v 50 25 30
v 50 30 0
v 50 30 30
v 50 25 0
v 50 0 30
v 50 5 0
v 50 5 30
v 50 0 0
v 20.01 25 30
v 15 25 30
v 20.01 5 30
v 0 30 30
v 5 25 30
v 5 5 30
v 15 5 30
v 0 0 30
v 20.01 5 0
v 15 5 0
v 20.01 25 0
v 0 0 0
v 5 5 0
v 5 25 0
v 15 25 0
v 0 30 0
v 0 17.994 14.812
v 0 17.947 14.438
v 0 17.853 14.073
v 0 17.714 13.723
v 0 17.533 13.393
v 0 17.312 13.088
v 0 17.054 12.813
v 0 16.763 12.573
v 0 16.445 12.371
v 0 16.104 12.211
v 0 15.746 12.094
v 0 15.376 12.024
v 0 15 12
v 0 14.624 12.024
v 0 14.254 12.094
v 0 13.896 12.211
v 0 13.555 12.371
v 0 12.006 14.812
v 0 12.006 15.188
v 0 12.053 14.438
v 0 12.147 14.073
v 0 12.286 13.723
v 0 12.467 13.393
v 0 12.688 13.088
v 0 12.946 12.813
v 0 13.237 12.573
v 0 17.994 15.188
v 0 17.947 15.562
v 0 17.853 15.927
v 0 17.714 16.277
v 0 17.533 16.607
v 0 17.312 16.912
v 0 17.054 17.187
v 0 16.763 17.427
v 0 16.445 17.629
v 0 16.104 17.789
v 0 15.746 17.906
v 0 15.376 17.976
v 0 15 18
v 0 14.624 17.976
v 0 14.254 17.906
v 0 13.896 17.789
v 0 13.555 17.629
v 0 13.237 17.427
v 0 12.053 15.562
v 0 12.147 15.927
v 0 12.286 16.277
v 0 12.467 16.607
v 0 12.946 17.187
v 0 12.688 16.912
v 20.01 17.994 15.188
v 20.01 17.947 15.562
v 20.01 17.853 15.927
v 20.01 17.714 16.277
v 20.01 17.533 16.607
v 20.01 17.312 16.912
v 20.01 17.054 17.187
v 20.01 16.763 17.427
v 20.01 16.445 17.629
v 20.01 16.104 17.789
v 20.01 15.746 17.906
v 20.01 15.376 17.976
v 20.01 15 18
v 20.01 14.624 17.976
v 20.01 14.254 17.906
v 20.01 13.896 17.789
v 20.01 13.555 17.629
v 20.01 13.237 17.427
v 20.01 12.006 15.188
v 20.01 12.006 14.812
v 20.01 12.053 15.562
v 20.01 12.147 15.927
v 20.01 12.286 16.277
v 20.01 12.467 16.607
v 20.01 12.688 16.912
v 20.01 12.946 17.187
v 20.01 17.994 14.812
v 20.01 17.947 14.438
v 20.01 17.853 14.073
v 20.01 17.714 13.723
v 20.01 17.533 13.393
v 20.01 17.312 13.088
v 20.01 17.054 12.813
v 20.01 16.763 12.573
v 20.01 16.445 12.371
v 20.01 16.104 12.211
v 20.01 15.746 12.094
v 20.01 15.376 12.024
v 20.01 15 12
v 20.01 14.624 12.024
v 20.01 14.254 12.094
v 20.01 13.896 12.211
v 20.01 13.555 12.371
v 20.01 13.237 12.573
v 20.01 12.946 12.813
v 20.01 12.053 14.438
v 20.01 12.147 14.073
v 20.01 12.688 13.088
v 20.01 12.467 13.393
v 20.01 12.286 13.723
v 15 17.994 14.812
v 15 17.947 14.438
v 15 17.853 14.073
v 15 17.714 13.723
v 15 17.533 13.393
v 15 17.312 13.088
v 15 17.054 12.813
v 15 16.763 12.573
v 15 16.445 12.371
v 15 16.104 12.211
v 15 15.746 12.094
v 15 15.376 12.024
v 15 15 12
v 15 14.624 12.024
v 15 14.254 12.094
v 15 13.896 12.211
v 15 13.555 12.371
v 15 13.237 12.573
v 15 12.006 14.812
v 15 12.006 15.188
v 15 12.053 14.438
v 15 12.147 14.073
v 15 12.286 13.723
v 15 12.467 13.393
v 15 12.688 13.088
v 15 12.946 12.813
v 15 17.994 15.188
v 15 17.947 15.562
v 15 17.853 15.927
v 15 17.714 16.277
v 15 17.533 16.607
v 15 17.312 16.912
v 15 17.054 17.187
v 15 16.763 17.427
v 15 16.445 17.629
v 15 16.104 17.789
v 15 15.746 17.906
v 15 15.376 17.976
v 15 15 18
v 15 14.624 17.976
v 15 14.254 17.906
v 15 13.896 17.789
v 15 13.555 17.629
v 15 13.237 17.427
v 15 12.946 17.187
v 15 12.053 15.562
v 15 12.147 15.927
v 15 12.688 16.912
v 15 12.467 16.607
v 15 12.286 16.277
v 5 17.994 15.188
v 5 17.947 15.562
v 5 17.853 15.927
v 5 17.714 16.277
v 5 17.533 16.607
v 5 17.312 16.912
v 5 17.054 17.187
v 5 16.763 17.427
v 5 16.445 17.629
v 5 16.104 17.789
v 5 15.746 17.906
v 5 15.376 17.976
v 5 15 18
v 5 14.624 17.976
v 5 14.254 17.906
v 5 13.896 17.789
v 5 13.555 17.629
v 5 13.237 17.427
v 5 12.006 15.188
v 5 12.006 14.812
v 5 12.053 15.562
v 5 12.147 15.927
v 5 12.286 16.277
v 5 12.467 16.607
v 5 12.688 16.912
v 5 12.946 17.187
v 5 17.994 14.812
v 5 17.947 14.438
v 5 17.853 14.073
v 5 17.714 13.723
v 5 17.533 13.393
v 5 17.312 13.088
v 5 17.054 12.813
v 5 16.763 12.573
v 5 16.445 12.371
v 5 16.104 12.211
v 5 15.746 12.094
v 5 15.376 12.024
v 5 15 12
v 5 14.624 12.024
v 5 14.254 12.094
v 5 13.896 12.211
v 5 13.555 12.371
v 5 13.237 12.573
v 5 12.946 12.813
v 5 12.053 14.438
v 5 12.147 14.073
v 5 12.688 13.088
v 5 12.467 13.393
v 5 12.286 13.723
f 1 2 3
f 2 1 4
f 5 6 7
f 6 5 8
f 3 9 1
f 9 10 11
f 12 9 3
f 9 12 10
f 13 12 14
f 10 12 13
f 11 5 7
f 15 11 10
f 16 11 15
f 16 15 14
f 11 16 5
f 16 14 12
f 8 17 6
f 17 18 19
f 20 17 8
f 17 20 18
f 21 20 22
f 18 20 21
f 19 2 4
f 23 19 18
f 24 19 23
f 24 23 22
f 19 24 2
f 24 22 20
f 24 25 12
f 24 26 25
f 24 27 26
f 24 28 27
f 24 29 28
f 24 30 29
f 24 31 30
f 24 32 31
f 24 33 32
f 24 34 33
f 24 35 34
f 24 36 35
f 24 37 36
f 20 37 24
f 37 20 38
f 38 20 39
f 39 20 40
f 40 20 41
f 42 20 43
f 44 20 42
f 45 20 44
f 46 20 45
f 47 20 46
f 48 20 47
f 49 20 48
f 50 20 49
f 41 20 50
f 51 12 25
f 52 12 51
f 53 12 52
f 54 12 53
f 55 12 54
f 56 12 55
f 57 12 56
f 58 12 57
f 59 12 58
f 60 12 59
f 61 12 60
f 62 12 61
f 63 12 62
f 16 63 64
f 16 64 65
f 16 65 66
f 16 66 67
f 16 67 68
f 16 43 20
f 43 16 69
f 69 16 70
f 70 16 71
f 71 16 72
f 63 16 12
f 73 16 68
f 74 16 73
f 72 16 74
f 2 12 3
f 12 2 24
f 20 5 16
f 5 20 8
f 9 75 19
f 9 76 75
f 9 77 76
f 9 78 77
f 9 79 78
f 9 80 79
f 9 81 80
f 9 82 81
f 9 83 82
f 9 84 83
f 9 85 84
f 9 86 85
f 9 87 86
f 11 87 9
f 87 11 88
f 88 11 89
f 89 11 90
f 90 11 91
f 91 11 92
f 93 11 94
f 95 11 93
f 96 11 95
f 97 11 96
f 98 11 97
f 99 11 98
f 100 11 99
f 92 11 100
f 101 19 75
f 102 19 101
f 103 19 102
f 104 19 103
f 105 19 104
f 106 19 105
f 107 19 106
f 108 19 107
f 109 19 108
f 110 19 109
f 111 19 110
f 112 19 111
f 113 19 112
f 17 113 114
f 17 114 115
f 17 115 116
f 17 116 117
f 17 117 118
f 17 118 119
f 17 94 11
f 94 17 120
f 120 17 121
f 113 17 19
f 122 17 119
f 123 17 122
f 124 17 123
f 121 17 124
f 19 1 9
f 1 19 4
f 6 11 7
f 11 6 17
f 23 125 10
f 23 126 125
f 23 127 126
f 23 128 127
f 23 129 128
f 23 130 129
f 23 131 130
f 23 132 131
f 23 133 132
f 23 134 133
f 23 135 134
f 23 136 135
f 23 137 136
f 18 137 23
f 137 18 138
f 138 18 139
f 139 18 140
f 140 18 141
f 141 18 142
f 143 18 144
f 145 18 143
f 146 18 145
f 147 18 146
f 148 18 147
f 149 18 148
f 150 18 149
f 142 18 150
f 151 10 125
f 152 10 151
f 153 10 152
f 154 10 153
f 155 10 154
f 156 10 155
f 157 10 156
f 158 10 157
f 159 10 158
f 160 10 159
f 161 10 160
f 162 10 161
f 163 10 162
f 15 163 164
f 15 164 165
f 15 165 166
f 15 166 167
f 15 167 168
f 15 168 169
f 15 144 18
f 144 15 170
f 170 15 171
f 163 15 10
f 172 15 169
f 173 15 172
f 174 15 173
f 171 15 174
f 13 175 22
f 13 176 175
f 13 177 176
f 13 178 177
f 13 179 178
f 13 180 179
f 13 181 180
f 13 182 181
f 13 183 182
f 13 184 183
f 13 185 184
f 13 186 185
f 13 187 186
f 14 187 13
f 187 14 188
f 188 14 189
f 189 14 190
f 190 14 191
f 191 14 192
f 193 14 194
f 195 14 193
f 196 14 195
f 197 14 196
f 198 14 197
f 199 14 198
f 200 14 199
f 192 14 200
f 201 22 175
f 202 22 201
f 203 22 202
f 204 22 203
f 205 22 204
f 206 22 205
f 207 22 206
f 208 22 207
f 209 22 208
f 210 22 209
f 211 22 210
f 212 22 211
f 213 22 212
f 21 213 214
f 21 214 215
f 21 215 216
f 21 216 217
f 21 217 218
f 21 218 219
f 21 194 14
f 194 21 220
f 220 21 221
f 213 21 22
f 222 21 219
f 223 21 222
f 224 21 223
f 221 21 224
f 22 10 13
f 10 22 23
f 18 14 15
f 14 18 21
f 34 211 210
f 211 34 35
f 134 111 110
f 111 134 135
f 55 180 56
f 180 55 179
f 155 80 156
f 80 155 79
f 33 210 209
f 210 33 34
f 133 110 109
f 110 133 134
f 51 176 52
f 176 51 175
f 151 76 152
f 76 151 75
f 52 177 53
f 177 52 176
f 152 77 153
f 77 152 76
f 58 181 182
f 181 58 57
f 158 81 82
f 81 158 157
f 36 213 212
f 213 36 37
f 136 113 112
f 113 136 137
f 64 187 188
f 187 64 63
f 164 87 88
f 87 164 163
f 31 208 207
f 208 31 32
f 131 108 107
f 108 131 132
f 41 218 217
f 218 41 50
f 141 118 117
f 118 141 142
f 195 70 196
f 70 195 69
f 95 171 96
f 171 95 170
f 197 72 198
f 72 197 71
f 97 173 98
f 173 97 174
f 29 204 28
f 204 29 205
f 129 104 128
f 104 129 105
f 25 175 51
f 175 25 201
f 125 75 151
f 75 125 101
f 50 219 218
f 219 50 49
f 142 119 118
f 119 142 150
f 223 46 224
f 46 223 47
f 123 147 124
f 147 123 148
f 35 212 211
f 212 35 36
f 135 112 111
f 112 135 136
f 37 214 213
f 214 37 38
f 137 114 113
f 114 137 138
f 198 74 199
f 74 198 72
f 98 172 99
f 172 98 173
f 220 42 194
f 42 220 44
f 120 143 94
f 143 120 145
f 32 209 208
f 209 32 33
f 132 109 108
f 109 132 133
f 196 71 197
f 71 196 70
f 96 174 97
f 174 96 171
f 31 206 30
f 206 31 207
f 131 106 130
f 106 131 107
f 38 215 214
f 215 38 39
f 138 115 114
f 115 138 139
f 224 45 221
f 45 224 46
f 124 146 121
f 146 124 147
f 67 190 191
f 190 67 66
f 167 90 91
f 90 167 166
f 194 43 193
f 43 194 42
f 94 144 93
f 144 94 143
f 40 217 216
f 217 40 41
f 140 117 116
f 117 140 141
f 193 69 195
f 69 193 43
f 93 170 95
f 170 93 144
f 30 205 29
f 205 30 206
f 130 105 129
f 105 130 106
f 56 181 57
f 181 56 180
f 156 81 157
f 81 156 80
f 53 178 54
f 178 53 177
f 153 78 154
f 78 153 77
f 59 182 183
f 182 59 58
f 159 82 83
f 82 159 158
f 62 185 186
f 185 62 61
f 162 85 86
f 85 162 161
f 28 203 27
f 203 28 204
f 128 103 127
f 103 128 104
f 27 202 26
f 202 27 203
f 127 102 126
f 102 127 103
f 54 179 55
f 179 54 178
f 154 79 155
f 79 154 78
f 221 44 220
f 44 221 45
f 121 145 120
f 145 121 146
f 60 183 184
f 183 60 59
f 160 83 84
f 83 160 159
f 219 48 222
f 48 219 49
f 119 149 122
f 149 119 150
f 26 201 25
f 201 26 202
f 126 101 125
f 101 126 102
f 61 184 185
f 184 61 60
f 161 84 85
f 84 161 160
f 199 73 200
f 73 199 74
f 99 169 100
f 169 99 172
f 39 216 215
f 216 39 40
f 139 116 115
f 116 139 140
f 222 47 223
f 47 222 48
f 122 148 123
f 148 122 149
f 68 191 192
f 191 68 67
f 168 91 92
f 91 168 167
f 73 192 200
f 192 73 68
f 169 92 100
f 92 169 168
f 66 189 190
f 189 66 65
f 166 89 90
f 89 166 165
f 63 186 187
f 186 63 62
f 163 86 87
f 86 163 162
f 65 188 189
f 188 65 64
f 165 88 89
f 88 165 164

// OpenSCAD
/*
 * file: wood-plug-molding.scad
 * author: gregor binder <gregor_reprap@catrix.at>
 * date: 28.12.2013
 * last change: 28.12.2013
 * license: CC BY-NC-SA 4.0
 */

hole_diameter=6;
thickness=5;
wood_thickness=20;
depth=30;
length1=30;
length2=20;
$fn=50;

/****************/

temp_thickness=wood_thickness+2*thickness;
temp_length=length1+length2;

difference() {
	cube([temp_length,temp_thickness,depth]);
	translate([length2+0.01,thickness,-0.1])
		cube([length1,wood_thickness,depth+5]);
	translate([thickness,thickness,-0.1])
		cube([length2-2*thickness,wood_thickness,depth+5]);
	translate([-0.1,temp_thickness/2,depth/2])
		rotate([0,90,0])
			cylinder(h=temp_length+5,r=hole_diameter/2);
}
